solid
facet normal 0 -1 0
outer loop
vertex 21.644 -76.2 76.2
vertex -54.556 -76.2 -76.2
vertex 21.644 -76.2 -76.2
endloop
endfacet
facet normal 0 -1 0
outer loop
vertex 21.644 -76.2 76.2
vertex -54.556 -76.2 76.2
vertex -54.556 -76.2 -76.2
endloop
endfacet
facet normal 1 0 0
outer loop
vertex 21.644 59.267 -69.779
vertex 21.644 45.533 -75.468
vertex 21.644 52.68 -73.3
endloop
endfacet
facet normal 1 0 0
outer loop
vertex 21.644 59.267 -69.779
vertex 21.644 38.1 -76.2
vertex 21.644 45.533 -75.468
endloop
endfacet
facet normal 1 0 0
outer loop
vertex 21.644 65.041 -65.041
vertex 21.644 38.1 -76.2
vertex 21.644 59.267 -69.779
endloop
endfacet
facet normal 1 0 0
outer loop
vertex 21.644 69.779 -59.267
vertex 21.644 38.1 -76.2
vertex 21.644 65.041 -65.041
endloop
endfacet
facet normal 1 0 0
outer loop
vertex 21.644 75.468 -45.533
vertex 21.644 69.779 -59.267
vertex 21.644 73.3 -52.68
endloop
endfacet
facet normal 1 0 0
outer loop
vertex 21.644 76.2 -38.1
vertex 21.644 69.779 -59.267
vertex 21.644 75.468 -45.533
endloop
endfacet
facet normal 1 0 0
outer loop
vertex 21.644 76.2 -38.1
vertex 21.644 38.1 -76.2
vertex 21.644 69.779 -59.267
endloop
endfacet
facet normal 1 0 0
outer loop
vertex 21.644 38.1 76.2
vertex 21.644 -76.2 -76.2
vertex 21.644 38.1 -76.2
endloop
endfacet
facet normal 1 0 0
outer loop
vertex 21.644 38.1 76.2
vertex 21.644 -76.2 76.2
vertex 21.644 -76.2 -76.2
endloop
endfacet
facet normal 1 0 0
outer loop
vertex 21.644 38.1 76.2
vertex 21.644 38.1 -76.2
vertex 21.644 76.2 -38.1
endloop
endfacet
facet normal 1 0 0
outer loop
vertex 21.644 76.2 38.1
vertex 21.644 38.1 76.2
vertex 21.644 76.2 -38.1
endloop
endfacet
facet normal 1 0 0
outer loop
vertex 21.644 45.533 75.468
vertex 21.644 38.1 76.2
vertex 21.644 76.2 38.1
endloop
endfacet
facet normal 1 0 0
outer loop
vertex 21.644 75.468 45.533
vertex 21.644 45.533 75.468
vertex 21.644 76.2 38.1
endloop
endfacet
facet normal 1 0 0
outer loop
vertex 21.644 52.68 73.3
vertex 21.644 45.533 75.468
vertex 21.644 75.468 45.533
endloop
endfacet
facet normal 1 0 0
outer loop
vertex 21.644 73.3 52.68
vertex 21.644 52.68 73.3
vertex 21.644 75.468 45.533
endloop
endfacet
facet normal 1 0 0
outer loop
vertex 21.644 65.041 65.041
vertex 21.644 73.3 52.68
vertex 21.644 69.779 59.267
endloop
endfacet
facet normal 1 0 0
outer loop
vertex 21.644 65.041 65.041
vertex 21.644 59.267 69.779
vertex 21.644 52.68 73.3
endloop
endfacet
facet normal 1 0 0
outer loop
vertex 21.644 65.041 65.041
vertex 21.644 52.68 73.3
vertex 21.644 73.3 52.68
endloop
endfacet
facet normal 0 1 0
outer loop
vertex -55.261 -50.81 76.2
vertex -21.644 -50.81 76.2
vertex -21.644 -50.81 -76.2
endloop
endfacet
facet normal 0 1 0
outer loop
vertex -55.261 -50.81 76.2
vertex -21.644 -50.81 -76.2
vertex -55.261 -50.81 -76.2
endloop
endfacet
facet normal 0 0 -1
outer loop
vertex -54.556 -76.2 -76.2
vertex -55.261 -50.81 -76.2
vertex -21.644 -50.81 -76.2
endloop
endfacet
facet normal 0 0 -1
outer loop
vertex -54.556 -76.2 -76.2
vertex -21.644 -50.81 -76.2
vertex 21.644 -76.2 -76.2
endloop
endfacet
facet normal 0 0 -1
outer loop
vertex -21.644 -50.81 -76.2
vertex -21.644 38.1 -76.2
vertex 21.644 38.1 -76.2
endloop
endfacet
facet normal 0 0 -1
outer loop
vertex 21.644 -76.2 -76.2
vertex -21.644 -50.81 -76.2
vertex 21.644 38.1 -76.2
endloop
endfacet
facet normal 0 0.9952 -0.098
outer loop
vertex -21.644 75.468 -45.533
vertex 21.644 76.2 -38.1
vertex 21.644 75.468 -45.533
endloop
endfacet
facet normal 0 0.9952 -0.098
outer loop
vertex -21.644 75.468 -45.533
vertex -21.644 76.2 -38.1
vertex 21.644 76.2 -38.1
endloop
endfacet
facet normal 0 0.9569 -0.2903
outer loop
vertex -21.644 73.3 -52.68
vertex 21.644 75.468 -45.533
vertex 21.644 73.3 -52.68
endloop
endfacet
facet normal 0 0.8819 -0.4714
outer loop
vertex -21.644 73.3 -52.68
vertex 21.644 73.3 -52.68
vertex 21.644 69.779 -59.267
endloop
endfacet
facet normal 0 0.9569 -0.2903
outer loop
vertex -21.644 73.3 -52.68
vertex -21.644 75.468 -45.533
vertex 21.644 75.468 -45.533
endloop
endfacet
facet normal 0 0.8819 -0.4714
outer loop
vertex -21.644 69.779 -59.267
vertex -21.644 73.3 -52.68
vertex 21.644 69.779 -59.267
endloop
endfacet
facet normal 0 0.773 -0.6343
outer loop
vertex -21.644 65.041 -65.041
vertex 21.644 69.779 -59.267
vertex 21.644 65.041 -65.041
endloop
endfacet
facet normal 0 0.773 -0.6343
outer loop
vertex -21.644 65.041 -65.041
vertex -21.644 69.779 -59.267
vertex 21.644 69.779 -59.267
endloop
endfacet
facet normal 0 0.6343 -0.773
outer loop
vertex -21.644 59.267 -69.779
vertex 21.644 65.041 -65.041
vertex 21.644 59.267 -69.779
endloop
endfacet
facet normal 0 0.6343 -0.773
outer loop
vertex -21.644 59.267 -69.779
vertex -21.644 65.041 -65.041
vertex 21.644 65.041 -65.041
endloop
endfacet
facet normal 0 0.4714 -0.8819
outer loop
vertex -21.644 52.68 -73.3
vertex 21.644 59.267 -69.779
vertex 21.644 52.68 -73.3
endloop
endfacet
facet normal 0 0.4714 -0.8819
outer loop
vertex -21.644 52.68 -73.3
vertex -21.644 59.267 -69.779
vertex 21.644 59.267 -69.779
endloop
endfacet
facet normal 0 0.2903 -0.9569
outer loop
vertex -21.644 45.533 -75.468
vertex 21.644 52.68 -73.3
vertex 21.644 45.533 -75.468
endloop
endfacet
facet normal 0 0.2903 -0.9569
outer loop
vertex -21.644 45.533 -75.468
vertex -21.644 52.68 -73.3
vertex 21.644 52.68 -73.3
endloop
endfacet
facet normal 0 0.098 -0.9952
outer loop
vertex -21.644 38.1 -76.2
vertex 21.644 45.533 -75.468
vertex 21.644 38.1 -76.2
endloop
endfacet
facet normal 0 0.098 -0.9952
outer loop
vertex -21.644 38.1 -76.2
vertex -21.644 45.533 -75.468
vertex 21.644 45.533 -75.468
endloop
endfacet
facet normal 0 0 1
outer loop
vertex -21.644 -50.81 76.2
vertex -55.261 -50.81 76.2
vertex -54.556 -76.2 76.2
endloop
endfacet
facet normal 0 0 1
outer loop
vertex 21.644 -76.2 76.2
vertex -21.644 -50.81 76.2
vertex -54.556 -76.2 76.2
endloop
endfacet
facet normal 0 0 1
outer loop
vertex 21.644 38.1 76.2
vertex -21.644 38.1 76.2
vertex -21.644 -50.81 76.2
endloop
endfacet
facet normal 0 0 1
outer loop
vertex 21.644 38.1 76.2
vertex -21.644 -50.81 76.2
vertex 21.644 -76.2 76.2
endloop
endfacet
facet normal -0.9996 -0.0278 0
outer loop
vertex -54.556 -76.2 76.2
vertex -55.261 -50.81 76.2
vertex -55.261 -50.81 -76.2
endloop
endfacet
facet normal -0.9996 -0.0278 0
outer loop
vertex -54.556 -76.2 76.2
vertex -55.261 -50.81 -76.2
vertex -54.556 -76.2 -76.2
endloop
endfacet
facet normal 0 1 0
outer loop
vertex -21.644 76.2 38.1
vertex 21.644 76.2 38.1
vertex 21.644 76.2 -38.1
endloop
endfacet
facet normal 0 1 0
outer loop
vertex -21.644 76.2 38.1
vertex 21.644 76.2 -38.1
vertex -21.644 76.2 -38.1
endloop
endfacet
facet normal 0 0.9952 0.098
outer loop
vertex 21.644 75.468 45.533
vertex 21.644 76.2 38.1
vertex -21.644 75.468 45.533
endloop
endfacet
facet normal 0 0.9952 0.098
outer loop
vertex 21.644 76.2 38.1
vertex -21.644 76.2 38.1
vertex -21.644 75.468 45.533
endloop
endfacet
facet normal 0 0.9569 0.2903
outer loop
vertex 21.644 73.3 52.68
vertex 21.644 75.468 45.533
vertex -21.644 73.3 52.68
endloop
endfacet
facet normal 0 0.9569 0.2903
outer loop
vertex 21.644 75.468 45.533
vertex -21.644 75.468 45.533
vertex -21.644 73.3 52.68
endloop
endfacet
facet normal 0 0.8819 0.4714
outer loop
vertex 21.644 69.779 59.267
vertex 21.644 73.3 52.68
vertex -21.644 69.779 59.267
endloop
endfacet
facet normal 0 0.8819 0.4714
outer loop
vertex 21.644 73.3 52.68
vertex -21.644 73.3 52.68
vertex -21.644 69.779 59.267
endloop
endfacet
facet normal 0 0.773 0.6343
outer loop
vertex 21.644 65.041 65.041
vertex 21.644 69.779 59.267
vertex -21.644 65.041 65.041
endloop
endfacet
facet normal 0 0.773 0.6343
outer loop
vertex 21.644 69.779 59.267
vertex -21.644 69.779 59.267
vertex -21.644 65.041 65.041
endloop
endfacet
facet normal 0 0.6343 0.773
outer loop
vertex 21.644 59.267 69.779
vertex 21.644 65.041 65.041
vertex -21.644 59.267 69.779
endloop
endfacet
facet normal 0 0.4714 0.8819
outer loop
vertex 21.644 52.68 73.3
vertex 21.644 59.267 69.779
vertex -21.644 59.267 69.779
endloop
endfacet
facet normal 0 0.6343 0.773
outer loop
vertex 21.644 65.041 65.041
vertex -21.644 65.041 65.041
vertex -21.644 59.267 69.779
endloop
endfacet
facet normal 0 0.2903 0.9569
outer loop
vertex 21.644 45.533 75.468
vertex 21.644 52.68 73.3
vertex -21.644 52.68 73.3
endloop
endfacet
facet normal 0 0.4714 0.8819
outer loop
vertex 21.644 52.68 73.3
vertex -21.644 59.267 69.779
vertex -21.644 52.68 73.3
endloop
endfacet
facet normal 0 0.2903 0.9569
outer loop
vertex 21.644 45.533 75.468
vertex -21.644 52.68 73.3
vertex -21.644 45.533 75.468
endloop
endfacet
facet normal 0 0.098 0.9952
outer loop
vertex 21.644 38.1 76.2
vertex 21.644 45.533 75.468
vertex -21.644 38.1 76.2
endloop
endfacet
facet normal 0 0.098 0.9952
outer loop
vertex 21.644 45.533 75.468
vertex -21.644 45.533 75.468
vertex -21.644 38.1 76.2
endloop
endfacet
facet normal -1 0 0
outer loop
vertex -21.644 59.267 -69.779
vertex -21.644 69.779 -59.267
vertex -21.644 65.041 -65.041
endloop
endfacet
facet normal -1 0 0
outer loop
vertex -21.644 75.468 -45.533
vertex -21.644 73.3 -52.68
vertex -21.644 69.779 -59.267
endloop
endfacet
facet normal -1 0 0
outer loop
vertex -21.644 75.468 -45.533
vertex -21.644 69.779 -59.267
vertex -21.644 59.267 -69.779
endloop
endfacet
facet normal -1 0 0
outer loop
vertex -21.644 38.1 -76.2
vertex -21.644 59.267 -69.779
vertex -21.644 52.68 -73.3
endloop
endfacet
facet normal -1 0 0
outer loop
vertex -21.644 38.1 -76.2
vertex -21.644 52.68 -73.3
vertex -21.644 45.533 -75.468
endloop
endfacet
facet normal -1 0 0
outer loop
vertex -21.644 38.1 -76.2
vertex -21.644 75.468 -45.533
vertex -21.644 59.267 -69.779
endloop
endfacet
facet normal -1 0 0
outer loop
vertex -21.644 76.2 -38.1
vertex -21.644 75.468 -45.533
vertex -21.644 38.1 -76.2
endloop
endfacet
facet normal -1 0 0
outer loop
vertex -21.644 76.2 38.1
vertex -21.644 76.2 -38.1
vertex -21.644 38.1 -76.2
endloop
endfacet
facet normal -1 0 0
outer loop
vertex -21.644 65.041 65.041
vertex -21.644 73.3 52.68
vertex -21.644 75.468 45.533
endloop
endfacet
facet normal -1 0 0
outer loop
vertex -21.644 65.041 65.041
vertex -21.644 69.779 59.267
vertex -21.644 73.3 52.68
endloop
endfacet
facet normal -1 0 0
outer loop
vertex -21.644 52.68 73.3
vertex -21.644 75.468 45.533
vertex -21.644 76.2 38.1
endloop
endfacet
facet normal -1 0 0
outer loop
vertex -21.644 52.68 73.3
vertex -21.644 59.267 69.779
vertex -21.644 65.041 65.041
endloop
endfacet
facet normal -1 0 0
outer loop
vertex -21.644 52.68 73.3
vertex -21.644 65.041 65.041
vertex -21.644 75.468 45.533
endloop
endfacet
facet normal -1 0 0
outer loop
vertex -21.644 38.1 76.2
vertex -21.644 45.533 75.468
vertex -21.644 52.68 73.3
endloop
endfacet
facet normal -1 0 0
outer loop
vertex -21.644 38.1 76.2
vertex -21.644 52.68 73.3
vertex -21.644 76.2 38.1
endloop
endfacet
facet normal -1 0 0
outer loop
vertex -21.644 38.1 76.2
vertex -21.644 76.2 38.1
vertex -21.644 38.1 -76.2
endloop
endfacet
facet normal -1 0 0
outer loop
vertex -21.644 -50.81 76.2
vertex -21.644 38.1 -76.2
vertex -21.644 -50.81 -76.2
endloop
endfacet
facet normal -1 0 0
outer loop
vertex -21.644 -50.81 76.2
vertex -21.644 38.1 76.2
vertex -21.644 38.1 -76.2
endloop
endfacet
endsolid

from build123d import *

# Parameters (mm, degrees)
F1_DEPTH = 76.2
F2_R     = 38.1


# Not quite as in the source:
# - ends of sketch curves that miss each other by under 0.0002 mm in the source are joined


with BuildPart() as f1:
    # F0 (on Top) → F1 (new body, symmetric)
    with BuildSketch(Plane.XY):
        Polygon((21.6444802228, 76.2), (-21.6444802228, 76.2), (-21.6444802228, -50.8097953513), (-55.2607951227, -50.8097953513), (-54.5555197772, -76.2), (-21.6444802228, -76.2), (21.6444802228, -76.2), align=None)
    extrude(amount=F1_DEPTH, both=True)

    # F2
    f2_edges = [f1.edges().sort_by_distance(p)[0] for p in [
        (0, 76.2, -76.2),
        (0, 76.2, 76.2),
    ]]
    fillet(f2_edges, radius=F2_R)


solid = f1.part
